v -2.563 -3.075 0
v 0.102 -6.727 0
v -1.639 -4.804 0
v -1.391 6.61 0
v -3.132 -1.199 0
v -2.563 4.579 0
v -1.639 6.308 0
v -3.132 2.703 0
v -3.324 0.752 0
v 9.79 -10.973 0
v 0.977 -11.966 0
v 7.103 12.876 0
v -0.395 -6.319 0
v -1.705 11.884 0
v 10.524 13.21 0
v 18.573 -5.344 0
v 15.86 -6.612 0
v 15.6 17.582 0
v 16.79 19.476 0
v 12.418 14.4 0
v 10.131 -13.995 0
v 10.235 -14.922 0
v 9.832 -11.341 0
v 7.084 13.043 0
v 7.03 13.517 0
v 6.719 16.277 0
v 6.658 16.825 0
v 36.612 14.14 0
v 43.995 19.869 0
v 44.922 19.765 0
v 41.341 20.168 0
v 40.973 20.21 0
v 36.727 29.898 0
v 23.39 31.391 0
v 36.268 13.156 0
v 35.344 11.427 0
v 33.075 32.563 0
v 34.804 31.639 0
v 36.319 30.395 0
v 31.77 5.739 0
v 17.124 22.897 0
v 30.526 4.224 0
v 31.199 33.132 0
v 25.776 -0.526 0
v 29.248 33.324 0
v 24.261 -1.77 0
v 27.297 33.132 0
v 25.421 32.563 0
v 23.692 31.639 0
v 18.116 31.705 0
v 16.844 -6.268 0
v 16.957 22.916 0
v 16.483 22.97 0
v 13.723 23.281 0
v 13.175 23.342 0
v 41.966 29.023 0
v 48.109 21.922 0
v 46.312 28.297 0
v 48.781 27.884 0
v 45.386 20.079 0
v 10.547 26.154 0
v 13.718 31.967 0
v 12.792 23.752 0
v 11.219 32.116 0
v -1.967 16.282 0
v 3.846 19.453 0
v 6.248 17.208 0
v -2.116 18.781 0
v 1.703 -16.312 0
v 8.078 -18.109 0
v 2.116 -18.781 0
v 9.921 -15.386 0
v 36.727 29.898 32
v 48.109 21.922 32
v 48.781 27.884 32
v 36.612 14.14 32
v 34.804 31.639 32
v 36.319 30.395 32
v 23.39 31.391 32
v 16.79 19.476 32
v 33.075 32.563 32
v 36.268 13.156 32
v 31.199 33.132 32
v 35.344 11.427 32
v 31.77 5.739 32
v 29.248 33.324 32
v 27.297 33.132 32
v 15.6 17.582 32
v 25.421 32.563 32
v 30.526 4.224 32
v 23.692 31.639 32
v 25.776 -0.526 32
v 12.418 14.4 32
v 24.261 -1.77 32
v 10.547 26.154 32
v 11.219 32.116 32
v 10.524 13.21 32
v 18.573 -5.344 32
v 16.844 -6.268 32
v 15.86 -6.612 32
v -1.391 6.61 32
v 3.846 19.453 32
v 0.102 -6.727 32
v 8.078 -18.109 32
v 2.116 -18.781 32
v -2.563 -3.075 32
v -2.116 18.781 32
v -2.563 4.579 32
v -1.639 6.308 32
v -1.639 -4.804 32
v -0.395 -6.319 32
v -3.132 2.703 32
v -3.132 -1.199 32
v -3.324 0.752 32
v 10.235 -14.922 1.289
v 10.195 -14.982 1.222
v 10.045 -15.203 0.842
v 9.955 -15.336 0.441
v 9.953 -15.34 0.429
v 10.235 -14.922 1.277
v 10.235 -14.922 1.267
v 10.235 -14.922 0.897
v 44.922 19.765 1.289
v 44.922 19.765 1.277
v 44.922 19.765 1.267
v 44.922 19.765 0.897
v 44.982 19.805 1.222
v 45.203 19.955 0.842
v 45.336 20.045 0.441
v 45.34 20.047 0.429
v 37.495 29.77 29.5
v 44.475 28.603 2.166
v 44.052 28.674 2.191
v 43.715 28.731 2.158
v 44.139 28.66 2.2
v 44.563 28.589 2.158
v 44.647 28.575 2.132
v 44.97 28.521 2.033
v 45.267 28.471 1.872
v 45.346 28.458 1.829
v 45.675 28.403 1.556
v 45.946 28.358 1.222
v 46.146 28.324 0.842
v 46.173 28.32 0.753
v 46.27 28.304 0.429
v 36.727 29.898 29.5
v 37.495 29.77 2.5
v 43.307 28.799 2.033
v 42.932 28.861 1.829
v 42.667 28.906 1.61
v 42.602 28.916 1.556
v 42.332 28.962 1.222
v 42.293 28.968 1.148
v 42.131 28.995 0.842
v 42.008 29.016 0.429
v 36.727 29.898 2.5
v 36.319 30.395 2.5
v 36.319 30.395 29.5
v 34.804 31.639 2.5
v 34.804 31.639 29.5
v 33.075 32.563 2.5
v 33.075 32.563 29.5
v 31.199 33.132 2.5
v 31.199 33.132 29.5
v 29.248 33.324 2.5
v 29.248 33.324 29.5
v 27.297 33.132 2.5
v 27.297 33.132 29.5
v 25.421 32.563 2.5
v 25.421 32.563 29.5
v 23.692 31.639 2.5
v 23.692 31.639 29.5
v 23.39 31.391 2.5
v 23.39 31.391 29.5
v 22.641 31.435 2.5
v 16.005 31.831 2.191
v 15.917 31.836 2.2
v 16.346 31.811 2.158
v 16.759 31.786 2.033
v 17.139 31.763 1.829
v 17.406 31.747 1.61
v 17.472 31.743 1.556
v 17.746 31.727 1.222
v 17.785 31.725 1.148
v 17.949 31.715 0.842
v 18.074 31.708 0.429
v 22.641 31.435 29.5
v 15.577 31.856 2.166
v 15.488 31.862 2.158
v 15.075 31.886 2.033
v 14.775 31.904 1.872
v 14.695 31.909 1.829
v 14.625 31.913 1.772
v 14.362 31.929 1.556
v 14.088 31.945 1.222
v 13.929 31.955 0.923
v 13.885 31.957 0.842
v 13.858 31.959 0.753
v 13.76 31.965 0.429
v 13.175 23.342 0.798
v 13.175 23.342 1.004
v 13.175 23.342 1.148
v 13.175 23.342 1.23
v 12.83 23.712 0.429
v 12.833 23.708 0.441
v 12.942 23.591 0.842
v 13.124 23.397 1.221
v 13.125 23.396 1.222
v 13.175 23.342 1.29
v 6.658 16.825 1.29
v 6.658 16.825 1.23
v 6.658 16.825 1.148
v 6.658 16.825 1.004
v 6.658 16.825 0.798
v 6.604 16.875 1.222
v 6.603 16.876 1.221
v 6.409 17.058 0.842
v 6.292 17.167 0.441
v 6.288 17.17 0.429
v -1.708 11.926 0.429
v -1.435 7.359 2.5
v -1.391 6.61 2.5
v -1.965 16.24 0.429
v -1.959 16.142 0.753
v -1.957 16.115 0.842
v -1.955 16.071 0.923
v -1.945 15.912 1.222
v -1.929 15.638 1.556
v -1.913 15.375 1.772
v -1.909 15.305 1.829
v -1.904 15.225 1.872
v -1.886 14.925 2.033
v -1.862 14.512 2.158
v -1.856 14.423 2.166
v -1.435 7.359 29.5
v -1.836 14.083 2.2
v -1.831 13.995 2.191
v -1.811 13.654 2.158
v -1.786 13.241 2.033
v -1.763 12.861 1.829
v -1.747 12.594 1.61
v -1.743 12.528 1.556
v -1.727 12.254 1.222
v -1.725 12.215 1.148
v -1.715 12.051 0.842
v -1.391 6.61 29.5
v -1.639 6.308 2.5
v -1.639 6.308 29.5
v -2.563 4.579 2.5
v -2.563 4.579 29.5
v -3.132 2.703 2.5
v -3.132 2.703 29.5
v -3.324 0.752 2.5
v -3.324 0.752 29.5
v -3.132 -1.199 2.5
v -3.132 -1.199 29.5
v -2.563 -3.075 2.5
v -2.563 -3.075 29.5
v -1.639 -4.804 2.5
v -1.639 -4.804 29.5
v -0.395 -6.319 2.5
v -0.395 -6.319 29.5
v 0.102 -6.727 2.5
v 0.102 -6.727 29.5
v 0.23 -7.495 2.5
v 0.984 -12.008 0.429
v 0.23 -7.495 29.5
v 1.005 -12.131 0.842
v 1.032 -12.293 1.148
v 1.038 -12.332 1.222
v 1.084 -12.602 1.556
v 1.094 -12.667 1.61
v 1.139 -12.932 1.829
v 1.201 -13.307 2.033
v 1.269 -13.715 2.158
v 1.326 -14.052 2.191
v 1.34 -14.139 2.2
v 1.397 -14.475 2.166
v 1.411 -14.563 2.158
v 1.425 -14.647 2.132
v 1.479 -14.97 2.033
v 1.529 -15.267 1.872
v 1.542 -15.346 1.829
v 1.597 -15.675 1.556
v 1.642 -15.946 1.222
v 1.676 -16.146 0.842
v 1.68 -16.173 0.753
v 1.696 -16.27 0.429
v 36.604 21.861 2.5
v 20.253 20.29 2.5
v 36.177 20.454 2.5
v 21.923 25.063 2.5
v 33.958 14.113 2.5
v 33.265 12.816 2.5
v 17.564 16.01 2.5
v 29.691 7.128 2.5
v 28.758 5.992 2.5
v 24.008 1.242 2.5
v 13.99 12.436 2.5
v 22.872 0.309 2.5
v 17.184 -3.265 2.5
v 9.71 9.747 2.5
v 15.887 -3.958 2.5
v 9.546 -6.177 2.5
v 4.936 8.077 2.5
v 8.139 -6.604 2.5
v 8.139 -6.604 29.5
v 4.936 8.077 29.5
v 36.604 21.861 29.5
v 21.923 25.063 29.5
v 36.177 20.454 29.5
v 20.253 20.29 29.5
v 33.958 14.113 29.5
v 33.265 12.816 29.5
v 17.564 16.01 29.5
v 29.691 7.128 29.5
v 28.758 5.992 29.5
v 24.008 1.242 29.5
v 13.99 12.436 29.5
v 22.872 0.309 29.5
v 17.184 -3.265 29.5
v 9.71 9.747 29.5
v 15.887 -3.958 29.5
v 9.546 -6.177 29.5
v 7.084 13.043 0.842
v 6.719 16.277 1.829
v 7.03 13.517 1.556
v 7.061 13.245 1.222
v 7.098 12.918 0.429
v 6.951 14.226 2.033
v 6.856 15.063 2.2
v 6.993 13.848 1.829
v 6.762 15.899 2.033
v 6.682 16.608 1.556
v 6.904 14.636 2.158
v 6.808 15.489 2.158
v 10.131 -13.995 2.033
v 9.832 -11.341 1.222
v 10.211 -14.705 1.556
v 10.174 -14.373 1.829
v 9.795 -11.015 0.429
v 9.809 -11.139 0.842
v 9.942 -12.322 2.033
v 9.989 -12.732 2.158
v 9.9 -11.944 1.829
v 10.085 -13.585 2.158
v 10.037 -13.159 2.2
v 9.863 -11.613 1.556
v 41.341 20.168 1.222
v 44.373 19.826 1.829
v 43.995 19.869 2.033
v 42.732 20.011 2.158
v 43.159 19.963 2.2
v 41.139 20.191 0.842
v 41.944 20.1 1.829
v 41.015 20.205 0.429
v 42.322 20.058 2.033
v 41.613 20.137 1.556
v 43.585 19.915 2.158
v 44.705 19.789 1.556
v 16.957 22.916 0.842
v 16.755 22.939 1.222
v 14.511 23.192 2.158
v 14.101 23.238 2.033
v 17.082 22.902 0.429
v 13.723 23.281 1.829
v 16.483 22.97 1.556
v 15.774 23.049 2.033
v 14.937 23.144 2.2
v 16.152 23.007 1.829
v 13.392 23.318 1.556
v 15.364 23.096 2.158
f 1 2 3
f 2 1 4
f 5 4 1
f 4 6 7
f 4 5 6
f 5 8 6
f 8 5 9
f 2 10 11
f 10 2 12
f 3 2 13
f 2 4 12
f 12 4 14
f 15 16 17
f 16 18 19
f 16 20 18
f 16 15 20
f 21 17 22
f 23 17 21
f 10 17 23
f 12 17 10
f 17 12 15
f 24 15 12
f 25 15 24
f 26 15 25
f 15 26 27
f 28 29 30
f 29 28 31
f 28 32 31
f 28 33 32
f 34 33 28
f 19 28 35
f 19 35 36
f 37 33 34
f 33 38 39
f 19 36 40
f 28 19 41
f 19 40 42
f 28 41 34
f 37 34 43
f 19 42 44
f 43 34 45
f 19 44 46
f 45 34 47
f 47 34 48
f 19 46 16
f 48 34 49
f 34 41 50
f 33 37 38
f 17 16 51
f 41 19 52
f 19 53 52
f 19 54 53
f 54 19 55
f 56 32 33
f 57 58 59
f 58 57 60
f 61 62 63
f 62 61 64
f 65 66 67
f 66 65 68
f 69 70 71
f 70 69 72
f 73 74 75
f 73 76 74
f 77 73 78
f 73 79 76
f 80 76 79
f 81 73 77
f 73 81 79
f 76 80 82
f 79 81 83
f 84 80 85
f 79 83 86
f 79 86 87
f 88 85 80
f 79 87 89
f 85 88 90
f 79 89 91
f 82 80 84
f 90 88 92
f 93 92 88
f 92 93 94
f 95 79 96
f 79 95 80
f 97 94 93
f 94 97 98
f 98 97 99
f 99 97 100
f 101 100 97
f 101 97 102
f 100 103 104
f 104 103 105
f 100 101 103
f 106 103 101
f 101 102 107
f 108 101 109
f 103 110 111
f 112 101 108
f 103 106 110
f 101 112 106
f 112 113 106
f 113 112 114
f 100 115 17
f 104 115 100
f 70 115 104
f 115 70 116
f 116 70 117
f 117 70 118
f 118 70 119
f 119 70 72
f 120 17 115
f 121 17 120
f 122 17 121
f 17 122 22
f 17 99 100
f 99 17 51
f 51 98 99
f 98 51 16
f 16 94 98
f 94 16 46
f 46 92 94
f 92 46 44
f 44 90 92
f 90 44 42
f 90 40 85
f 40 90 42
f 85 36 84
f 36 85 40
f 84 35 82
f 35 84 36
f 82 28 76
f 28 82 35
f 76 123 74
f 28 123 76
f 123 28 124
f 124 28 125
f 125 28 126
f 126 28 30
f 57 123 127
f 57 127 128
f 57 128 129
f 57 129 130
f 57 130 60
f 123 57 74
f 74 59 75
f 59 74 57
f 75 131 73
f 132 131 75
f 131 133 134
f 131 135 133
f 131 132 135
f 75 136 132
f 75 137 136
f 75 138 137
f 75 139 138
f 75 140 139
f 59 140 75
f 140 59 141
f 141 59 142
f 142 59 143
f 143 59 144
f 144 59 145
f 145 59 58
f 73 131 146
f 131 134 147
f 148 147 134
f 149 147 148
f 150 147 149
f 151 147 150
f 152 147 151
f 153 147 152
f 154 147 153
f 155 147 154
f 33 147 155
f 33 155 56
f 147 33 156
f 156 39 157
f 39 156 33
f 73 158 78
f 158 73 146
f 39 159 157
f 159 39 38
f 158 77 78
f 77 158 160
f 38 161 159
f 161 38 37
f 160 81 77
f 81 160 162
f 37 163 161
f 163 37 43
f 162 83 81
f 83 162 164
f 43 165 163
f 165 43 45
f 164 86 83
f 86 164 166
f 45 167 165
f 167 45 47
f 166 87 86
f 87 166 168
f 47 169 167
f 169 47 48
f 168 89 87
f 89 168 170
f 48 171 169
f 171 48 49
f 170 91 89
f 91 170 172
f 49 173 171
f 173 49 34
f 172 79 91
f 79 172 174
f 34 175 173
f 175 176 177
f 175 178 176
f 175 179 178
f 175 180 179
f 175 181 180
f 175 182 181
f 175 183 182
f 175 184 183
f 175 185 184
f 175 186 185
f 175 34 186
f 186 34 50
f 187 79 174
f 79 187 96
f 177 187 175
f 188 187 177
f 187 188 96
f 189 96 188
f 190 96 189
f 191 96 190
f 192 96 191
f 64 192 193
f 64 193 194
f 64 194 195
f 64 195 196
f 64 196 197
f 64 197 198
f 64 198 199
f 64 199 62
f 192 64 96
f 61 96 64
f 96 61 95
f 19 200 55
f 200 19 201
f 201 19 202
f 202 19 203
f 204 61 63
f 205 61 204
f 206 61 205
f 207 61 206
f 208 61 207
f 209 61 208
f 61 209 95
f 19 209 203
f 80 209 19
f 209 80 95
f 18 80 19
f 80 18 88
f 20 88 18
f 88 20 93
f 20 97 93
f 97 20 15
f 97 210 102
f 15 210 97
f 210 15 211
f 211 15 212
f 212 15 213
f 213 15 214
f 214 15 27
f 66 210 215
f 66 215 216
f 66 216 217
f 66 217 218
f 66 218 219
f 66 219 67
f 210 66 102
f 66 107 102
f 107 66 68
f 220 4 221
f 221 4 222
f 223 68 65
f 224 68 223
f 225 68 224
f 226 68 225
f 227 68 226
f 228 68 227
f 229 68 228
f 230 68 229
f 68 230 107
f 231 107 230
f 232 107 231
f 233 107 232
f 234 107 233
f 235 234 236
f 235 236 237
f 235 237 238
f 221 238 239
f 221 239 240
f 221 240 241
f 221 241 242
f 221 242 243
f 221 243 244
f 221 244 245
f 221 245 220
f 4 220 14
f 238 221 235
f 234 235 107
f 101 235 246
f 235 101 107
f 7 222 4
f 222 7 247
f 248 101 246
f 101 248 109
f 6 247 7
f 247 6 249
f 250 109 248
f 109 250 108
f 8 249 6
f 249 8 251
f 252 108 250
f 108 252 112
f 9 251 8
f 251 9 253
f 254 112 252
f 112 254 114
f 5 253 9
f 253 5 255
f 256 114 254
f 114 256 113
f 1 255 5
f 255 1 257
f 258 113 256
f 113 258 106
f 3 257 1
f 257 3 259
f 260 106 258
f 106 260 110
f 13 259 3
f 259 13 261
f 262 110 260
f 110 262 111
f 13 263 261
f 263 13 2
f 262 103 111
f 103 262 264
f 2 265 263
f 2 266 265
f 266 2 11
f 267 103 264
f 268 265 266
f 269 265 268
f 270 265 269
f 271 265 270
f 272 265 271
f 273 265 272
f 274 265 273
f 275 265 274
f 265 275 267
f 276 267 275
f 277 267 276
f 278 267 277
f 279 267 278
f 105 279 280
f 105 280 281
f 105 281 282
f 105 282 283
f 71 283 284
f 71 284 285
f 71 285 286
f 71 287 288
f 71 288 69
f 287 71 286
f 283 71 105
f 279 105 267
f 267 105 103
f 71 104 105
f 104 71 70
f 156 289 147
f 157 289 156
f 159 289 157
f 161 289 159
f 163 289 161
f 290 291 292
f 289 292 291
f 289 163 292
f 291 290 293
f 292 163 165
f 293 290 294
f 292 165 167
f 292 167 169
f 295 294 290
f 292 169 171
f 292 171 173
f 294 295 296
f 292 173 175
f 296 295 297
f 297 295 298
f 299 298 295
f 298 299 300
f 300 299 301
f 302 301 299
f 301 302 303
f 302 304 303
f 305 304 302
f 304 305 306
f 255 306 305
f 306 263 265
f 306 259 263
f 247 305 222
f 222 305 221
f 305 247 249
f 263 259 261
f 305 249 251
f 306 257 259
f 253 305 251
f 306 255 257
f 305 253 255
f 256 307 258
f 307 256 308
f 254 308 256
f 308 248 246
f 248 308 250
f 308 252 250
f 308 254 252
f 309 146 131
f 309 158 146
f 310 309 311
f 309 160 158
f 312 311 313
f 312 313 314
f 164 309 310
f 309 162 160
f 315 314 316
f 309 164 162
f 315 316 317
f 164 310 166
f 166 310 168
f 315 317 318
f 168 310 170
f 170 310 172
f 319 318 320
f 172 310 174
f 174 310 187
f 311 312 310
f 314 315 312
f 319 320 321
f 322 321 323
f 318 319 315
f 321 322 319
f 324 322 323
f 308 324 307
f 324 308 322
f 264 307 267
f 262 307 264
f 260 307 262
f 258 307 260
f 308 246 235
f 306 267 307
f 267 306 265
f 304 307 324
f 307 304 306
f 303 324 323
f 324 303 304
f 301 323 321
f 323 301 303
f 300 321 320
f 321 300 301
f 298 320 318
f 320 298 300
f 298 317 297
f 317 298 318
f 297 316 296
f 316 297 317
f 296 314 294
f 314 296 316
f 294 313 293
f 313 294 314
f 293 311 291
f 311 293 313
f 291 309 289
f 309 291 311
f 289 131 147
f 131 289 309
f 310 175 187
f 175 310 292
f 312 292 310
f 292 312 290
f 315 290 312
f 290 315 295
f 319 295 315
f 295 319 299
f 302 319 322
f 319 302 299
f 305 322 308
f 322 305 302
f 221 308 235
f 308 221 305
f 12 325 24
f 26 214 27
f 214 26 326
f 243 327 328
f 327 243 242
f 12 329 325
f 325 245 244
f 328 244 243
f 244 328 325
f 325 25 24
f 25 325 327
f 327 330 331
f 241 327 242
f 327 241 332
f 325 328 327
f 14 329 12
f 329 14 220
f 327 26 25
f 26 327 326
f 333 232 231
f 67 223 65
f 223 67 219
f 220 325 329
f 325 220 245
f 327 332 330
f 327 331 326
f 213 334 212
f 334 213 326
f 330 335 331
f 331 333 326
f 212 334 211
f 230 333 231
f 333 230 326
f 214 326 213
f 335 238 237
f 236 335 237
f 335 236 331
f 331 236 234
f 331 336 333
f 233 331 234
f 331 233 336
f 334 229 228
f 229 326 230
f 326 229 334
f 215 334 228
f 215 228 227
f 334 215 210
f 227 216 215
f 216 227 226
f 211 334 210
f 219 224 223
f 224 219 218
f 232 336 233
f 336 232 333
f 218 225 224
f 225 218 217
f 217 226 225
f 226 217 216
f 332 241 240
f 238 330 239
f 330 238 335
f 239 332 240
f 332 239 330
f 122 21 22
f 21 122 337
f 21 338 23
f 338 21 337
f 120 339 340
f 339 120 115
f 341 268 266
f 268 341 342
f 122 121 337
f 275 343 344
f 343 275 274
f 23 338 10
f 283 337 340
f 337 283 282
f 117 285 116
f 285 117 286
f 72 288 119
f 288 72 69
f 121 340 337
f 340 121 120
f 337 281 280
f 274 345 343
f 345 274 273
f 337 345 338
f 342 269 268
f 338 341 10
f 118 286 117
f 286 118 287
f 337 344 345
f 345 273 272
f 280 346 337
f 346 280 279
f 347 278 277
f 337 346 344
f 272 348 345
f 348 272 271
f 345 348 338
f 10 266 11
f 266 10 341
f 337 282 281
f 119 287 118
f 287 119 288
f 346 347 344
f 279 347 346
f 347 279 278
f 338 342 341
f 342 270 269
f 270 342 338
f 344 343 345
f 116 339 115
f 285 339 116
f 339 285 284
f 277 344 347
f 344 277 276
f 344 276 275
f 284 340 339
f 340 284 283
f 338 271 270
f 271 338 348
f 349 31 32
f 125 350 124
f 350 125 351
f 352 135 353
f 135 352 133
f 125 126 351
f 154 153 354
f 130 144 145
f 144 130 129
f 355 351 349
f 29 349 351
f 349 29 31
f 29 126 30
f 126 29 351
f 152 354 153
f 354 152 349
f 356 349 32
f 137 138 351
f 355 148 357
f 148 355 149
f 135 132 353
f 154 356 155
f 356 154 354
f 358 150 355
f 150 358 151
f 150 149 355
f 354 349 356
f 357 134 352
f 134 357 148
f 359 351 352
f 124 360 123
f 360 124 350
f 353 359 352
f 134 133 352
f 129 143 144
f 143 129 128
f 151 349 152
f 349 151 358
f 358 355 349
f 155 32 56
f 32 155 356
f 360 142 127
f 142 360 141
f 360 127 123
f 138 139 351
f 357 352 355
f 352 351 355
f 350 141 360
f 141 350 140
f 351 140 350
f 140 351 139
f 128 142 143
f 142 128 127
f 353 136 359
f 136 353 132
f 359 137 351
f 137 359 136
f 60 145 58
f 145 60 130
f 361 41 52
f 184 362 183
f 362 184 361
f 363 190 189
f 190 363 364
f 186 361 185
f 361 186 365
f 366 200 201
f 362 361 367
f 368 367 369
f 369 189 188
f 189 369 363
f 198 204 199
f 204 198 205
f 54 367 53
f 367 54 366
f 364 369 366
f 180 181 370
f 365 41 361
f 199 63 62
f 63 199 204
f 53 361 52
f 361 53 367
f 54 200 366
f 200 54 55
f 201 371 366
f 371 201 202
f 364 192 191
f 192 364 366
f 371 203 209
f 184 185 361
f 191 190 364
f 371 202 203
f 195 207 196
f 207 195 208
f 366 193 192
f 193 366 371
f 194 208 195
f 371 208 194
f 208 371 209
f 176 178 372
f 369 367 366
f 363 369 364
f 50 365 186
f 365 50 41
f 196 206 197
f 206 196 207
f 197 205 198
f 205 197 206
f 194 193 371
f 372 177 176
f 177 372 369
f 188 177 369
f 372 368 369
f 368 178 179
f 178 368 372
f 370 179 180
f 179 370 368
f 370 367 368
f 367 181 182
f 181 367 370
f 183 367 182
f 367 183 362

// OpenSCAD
$fn = 32;

// ----------------------------------------------------------------------
// Air duct: 20 mm duct, 2.5 mm wall, 32 mm across
// ----------------------------------------------------------------------

// --- parameters (mm) ---
duct_r = 10;              // duct core radius
duct_d = 20;              // duct core diameter
wall = 2.5;               // duct wall thickness
height = 32;              // duct width (extrusion height)
port_r = 18.9;            // port flange half width
port_d = 37.8;            // port flange width
port_t = 6;               // port flange thickness
bolt_d = 4.4;             // port bolt holes
bolt_offset = 14.2;       // bolt hole offset from the port axis

difference() {
  /* outer hull chain: tube with a flat flange plate at every port */
  linear_extrude(height = 32) {
    hull() {
      polygon([[2.116, -18.781], [-2.116, 18.781], [3.846, 19.453], [8.078, -18.109]]);
      translate([8.943, 1.008]) circle(r = 10);
    }
    hull() {
      translate([8.943, 1.008]) circle(r = 10);
      translate([6.676, 0.752]) circle(r = 10);
    }
    hull() {
      translate([6.676, 0.752]) circle(r = 10);
      translate([13.017, 2.971]) circle(r = 10);
    }
    hull() {
      translate([13.017, 2.971]) circle(r = 10);
      translate([18.705, 6.545]) circle(r = 10);
    }
    hull() {
      translate([18.705, 6.545]) circle(r = 10);
      translate([23.455, 11.295]) circle(r = 10);
    }
    hull() {
      translate([23.455, 11.295]) circle(r = 10);
      translate([27.029, 16.983]) circle(r = 10);
    }
    hull() {
      translate([27.029, 16.983]) circle(r = 10);
      translate([29.248, 23.324]) circle(r = 10);
    }
    hull() {
      translate([29.248, 23.324]) circle(r = 10);
      translate([28.992, 21.057]) circle(r = 10);
    }
    hull() {
      translate([28.992, 21.057]) circle(r = 10);
      polygon([[11.219, 32.116], [48.781, 27.884], [48.109, 21.922], [10.547, 26.154]]);
    }
  }
  /* air passage: the same chain inset by the wall, 5 mm proud of the ports */
  translate([0, 0, 2.5]) linear_extrude(height = 27) {
    hull() {
      translate([-4.969, -0.56]) circle(r = 7.5);
      translate([6.676, 0.752]) circle(r = 7.5);
    }
    hull() {
      translate([6.676, 0.752]) circle(r = 7.5);
      translate([13.017, 2.971]) circle(r = 7.5);
    }
    hull() {
      translate([13.017, 2.971]) circle(r = 7.5);
      translate([18.705, 6.545]) circle(r = 7.5);
    }
    hull() {
      translate([18.705, 6.545]) circle(r = 7.5);
      translate([23.455, 11.295]) circle(r = 7.5);
    }
    hull() {
      translate([23.455, 11.295]) circle(r = 7.5);
      translate([27.029, 16.983]) circle(r = 7.5);
    }
    hull() {
      translate([27.029, 16.983]) circle(r = 7.5);
      translate([29.248, 23.324]) circle(r = 7.5);
    }
    hull() {
      translate([29.248, 23.324]) circle(r = 7.5);
      translate([30.56, 34.969]) circle(r = 7.5);
    }
  }
  translate([0, 0]) rotate([0, 0, -83.57]) translate([-14.2, -2.5]) rotate([-90, 0, 0]) cylinder(h = 11, d = 4.4);
  translate([0, 0]) rotate([0, 0, -83.57]) translate([14.2, -2.5]) rotate([-90, 0, 0]) cylinder(h = 11, d = 4.4);
  translate([30, 30]) rotate([0, 0, 173.57]) translate([-14.2, -2.5]) rotate([-90, 0, 0]) cylinder(h = 11, d = 4.4);
  translate([30, 30]) rotate([0, 0, 173.57]) translate([14.2, -2.5]) rotate([-90, 0, 0]) cylinder(h = 11, d = 4.4);
}
